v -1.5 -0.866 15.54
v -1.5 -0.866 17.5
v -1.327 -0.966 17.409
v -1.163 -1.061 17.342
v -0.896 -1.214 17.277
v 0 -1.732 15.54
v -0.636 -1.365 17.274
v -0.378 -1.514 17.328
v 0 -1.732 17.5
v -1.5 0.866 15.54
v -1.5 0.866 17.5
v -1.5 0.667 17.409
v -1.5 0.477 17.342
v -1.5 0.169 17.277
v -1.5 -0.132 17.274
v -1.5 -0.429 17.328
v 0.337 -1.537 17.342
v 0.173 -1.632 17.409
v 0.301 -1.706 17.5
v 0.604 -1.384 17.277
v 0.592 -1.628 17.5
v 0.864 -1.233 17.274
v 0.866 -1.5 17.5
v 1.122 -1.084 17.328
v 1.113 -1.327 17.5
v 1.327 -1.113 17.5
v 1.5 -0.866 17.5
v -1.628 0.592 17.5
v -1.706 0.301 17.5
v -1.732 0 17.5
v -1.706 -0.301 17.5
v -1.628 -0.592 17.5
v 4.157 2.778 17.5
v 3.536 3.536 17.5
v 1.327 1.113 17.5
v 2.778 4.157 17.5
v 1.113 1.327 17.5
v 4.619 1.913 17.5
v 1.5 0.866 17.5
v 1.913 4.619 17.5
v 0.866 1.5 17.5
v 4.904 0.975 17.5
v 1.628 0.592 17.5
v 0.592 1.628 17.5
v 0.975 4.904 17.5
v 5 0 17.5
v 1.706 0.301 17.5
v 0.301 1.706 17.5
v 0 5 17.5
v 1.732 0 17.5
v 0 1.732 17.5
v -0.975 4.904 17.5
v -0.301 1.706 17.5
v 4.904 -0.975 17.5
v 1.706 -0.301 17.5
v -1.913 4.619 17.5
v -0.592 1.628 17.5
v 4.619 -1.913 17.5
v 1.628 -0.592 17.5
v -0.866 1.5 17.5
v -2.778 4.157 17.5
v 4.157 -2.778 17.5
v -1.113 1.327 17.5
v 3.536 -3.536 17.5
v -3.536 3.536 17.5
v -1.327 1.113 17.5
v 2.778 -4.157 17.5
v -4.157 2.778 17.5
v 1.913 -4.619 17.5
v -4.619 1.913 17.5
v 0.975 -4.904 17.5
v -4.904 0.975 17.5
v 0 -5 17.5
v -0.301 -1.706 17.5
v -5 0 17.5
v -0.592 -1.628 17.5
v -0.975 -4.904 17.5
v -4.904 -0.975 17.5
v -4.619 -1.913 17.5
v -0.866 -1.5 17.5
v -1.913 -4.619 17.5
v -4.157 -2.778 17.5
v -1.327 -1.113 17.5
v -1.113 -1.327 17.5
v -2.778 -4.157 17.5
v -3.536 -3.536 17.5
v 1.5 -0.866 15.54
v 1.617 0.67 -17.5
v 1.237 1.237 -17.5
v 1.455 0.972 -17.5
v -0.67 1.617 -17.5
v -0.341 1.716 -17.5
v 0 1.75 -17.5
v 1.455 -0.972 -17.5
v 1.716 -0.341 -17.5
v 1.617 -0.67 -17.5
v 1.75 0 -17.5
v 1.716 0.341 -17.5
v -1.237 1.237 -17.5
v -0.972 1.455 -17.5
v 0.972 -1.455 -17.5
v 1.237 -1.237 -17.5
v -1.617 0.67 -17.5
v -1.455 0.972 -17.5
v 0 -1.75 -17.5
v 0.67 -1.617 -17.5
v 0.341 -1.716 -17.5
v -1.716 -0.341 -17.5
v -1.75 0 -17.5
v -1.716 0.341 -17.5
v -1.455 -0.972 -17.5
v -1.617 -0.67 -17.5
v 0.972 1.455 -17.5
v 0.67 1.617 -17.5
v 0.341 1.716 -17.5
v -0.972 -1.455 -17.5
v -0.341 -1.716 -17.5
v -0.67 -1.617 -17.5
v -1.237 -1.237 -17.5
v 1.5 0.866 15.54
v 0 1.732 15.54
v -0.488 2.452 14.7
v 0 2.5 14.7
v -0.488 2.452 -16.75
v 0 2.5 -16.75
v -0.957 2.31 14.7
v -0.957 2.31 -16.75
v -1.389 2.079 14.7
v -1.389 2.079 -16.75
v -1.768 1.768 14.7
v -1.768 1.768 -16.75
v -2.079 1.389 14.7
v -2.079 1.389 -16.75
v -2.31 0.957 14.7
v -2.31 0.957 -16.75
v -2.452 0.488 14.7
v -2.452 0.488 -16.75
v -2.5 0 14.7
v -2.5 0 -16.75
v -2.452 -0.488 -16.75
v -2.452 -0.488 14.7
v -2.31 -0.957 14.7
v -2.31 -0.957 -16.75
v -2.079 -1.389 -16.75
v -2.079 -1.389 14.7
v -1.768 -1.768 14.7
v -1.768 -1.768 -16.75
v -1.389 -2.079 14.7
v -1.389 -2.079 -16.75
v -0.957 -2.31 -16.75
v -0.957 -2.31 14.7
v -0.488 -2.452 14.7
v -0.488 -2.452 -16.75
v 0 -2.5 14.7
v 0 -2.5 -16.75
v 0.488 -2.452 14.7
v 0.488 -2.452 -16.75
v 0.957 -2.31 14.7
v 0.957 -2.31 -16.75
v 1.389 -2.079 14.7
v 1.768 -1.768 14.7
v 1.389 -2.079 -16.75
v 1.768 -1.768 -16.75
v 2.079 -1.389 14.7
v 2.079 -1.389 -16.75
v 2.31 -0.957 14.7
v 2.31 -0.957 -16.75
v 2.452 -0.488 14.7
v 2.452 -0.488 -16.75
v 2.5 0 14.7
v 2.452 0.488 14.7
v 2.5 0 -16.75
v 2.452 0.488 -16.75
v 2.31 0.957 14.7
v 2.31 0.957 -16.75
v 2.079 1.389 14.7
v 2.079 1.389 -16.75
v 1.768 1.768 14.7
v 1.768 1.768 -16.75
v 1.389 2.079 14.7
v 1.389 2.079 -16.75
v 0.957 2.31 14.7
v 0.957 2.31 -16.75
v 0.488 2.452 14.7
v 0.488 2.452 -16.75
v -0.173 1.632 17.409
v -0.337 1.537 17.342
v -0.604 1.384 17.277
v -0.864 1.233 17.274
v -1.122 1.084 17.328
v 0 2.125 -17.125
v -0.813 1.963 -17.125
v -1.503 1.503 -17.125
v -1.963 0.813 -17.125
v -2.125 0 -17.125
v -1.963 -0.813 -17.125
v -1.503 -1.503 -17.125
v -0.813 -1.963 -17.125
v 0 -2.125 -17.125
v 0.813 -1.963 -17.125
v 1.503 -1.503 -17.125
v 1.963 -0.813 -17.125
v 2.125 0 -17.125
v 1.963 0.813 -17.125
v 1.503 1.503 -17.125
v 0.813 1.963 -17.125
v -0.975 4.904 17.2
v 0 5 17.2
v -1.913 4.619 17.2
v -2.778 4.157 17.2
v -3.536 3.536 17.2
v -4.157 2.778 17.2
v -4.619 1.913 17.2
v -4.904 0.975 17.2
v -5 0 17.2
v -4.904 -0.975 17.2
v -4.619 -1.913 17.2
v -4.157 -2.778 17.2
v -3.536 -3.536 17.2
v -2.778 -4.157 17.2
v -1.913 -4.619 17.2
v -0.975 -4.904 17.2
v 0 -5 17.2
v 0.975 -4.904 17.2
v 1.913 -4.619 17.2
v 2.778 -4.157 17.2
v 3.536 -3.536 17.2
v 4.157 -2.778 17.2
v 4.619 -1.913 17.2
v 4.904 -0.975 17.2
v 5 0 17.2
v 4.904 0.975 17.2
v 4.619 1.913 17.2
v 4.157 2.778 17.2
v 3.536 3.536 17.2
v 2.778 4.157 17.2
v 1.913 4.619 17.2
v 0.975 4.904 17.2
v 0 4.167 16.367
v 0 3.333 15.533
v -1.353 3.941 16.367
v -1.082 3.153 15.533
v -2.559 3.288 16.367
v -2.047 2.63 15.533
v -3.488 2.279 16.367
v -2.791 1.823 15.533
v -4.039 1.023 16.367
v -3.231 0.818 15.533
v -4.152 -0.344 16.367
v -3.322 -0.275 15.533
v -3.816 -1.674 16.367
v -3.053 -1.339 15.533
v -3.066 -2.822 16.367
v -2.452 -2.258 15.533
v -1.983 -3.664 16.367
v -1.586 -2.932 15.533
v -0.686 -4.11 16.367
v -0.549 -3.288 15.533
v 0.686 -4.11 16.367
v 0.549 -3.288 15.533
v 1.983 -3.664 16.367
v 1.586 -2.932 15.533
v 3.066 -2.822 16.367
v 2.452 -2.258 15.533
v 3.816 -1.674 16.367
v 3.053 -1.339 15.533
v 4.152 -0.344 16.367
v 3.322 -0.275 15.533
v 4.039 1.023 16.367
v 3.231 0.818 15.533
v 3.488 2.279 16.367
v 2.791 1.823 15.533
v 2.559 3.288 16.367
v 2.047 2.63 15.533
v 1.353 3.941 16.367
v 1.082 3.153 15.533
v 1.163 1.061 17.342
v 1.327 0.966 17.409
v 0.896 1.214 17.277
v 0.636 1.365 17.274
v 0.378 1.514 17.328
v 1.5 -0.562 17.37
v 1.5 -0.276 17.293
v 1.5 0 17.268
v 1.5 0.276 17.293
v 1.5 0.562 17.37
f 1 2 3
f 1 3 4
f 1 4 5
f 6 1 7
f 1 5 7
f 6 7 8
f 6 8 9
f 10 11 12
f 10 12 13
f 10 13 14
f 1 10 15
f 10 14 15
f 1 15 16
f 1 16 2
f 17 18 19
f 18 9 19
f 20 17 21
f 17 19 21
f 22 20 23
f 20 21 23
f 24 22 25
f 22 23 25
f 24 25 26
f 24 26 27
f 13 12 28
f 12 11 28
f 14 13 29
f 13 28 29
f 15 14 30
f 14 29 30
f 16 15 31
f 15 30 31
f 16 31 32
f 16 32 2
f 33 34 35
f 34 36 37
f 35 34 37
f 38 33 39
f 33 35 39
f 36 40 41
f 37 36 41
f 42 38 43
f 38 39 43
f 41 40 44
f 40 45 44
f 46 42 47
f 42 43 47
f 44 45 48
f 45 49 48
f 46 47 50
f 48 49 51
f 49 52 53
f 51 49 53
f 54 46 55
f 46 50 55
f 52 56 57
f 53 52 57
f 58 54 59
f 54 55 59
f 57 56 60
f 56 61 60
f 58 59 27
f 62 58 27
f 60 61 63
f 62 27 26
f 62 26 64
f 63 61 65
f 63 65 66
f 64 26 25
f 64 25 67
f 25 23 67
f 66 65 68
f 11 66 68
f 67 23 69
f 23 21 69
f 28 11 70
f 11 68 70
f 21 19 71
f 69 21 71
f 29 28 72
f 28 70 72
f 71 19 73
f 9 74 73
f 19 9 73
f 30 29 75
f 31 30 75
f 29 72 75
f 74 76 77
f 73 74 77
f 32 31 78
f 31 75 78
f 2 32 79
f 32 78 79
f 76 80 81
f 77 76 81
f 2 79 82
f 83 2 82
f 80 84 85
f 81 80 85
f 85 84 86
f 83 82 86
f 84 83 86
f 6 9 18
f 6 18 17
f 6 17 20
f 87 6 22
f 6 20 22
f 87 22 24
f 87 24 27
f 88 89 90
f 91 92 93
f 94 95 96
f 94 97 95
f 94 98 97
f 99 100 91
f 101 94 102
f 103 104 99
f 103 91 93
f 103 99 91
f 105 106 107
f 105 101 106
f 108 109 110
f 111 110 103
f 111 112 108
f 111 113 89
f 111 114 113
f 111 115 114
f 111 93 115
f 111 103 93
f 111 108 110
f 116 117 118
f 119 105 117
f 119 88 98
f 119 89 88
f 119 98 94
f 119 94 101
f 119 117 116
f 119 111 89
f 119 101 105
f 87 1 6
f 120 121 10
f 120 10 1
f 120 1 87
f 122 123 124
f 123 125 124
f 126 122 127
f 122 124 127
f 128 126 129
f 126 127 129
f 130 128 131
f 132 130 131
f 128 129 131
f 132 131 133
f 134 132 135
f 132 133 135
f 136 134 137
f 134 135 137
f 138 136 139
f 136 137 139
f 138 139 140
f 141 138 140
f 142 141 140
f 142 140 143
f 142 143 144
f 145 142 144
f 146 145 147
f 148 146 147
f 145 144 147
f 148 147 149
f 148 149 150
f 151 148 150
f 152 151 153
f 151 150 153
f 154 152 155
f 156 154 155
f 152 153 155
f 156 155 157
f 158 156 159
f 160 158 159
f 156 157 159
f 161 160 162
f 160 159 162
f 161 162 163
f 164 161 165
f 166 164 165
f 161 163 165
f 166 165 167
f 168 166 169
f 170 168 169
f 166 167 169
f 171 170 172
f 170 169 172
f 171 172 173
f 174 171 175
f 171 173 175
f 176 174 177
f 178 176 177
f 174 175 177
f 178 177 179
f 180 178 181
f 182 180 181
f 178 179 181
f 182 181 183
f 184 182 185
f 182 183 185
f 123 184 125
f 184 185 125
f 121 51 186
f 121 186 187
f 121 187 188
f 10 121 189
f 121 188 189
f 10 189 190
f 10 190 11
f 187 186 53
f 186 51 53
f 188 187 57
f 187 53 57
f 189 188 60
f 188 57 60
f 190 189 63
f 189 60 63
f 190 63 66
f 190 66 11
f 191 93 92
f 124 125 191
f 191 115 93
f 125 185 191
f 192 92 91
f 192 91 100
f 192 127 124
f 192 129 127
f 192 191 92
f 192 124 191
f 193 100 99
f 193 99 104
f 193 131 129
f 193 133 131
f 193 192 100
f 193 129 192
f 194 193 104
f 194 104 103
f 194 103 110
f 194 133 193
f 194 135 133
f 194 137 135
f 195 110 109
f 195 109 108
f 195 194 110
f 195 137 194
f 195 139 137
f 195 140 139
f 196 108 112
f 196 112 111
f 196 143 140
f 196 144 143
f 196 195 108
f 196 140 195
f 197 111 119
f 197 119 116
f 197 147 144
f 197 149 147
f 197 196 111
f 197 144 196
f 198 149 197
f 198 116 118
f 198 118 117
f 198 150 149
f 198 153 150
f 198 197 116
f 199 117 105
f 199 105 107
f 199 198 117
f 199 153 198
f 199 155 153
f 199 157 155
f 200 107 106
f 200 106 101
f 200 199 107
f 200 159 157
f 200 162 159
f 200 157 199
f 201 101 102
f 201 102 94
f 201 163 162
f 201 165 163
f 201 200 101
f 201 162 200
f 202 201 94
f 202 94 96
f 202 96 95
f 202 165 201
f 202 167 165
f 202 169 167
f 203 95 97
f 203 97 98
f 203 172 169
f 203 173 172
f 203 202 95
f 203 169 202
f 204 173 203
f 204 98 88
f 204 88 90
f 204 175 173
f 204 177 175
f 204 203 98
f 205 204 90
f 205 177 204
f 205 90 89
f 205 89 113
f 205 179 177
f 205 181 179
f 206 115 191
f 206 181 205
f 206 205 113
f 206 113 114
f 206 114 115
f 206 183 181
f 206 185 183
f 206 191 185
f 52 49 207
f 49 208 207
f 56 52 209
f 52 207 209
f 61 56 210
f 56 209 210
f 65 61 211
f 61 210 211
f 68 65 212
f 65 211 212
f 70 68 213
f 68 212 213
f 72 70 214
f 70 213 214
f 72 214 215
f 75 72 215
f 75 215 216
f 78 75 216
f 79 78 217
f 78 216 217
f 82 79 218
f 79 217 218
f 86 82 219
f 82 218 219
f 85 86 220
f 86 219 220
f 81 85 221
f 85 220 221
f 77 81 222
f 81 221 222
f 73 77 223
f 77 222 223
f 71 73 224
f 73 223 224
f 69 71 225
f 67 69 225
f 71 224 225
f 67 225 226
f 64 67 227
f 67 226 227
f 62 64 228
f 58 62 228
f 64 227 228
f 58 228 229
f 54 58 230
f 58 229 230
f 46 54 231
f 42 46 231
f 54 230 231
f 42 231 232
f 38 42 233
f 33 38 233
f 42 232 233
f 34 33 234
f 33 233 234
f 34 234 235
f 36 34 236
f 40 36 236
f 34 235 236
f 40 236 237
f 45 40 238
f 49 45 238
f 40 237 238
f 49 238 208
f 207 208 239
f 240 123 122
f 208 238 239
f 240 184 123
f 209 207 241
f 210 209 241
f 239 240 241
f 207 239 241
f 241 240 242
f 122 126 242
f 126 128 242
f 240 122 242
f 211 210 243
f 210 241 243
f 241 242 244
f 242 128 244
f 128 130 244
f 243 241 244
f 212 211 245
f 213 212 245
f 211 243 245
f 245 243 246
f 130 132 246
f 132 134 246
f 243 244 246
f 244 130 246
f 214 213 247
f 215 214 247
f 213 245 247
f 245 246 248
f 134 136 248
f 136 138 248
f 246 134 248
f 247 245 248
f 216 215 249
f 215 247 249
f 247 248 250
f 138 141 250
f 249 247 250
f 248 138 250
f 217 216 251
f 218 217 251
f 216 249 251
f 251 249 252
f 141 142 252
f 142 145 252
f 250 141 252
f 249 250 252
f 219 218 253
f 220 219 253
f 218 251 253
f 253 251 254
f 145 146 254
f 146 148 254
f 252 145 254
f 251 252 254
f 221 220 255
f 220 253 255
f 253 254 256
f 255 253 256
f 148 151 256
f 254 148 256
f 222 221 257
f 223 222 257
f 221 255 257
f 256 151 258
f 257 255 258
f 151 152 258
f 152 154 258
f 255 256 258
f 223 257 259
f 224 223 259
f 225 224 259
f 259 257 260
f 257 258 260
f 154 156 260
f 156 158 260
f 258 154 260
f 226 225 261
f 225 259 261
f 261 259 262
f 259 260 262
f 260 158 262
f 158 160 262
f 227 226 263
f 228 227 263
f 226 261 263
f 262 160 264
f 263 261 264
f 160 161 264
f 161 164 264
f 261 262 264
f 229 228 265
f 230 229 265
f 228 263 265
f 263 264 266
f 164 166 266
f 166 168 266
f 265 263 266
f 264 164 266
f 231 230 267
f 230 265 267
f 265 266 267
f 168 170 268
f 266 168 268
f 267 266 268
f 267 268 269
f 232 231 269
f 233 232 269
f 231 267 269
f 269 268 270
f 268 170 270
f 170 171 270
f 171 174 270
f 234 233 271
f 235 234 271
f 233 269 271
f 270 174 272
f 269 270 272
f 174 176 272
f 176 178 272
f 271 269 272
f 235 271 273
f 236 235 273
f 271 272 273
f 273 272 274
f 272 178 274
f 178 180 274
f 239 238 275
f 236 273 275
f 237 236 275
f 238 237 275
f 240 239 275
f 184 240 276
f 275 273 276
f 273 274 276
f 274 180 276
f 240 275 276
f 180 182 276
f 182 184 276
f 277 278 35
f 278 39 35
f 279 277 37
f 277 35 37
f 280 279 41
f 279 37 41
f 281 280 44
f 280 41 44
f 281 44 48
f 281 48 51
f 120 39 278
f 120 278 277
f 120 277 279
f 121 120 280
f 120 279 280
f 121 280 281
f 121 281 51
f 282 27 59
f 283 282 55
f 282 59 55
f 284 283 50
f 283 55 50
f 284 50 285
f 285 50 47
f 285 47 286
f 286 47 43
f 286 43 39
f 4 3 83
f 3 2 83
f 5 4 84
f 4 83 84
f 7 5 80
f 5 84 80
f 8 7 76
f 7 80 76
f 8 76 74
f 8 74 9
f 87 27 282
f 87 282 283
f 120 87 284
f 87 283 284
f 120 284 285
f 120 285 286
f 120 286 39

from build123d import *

# Parameters (mm, degrees)
SKETCH3_W          = 35
SKETCH3_H          = 2.5
CHAMFER1_SIZE      = 0.75
CUT_EXTRUDE1_DEPTH = 1.96
SKETCH9_R          = 1.732050808
CUT_EXTRUDE2_DEPTH = 1.96
CUT_EXTRUDE2_DRAFT = -45


with BuildPart() as part:
    # Sketch3 → Revolve1 (revolve)
    with BuildSketch(Plane(origin=(0, 0, 0), x_dir=(0, 0, -1), z_dir=(1, 0, 0))):
        with Locations((0, 1.25)):
            Rectangle(SKETCH3_W, SKETCH3_H)
    revolve(axis=Axis((0, 0, -17.5), (0, 0, 1)))

    # Chamfer1
    chamfer1_edges = [part.edges().sort_by_distance(p)[0] for p in [
        (0, -2.5, -17.5),
    ]]
    chamfer(chamfer1_edges, length=CHAMFER1_SIZE)

    # Sketch6 → Revolve2 (revolve)
    with BuildSketch(Plane(origin=(0, 0, 0), x_dir=(0, 0, -1), z_dir=(1, 0, 0))):
        Polygon((-17.5, 5), (-17.2, 5), (-14.7, 2.5), (-14.7, 0), (-17.5, 0), align=None)
    revolve(axis=Axis((0, 0, -17.5), (0, 0, 1)))

    # Sketch8 → Cut-Extrude1 (cut)
    with BuildSketch(Plane.XY.offset(17.5)):
        Polygon((0, 1.732050808), (-1.5, 0.866025404), (-1.5, -0.866025404), (0, -1.732050808), (1.5, -0.866025404), (1.5, 0.866025404), align=None)
    extrude(amount=-CUT_EXTRUDE1_DEPTH, mode=Mode.SUBTRACT)


with BuildPart() as cut_extrude2_tool:
    # Sketch9 → Cut-Extrude2 (with draft: the straight prism first)
    with BuildSketch(Plane.XY.offset(17.5)):
        Circle(SKETCH9_R)
    extrude(amount=-CUT_EXTRUDE2_DEPTH)
    # Cut-Extrude2: the draft: its side faces are tilted about the plane it starts from
    cut_extrude2_sides = [cut_extrude2_tool.faces().sort_by_distance(p)[0] for p in [
        (-1.732050808, 0, 16.52),
    ]]
    draft(cut_extrude2_sides, Plane.XY.offset(17.5), CUT_EXTRUDE2_DRAFT)


with BuildPart() as part_1:
    add(part.part)

    # Cut-Extrude2: cut by cut_extrude2_tool
    add(cut_extrude2_tool.part, mode=Mode.SUBTRACT)


solid = part_1.part
